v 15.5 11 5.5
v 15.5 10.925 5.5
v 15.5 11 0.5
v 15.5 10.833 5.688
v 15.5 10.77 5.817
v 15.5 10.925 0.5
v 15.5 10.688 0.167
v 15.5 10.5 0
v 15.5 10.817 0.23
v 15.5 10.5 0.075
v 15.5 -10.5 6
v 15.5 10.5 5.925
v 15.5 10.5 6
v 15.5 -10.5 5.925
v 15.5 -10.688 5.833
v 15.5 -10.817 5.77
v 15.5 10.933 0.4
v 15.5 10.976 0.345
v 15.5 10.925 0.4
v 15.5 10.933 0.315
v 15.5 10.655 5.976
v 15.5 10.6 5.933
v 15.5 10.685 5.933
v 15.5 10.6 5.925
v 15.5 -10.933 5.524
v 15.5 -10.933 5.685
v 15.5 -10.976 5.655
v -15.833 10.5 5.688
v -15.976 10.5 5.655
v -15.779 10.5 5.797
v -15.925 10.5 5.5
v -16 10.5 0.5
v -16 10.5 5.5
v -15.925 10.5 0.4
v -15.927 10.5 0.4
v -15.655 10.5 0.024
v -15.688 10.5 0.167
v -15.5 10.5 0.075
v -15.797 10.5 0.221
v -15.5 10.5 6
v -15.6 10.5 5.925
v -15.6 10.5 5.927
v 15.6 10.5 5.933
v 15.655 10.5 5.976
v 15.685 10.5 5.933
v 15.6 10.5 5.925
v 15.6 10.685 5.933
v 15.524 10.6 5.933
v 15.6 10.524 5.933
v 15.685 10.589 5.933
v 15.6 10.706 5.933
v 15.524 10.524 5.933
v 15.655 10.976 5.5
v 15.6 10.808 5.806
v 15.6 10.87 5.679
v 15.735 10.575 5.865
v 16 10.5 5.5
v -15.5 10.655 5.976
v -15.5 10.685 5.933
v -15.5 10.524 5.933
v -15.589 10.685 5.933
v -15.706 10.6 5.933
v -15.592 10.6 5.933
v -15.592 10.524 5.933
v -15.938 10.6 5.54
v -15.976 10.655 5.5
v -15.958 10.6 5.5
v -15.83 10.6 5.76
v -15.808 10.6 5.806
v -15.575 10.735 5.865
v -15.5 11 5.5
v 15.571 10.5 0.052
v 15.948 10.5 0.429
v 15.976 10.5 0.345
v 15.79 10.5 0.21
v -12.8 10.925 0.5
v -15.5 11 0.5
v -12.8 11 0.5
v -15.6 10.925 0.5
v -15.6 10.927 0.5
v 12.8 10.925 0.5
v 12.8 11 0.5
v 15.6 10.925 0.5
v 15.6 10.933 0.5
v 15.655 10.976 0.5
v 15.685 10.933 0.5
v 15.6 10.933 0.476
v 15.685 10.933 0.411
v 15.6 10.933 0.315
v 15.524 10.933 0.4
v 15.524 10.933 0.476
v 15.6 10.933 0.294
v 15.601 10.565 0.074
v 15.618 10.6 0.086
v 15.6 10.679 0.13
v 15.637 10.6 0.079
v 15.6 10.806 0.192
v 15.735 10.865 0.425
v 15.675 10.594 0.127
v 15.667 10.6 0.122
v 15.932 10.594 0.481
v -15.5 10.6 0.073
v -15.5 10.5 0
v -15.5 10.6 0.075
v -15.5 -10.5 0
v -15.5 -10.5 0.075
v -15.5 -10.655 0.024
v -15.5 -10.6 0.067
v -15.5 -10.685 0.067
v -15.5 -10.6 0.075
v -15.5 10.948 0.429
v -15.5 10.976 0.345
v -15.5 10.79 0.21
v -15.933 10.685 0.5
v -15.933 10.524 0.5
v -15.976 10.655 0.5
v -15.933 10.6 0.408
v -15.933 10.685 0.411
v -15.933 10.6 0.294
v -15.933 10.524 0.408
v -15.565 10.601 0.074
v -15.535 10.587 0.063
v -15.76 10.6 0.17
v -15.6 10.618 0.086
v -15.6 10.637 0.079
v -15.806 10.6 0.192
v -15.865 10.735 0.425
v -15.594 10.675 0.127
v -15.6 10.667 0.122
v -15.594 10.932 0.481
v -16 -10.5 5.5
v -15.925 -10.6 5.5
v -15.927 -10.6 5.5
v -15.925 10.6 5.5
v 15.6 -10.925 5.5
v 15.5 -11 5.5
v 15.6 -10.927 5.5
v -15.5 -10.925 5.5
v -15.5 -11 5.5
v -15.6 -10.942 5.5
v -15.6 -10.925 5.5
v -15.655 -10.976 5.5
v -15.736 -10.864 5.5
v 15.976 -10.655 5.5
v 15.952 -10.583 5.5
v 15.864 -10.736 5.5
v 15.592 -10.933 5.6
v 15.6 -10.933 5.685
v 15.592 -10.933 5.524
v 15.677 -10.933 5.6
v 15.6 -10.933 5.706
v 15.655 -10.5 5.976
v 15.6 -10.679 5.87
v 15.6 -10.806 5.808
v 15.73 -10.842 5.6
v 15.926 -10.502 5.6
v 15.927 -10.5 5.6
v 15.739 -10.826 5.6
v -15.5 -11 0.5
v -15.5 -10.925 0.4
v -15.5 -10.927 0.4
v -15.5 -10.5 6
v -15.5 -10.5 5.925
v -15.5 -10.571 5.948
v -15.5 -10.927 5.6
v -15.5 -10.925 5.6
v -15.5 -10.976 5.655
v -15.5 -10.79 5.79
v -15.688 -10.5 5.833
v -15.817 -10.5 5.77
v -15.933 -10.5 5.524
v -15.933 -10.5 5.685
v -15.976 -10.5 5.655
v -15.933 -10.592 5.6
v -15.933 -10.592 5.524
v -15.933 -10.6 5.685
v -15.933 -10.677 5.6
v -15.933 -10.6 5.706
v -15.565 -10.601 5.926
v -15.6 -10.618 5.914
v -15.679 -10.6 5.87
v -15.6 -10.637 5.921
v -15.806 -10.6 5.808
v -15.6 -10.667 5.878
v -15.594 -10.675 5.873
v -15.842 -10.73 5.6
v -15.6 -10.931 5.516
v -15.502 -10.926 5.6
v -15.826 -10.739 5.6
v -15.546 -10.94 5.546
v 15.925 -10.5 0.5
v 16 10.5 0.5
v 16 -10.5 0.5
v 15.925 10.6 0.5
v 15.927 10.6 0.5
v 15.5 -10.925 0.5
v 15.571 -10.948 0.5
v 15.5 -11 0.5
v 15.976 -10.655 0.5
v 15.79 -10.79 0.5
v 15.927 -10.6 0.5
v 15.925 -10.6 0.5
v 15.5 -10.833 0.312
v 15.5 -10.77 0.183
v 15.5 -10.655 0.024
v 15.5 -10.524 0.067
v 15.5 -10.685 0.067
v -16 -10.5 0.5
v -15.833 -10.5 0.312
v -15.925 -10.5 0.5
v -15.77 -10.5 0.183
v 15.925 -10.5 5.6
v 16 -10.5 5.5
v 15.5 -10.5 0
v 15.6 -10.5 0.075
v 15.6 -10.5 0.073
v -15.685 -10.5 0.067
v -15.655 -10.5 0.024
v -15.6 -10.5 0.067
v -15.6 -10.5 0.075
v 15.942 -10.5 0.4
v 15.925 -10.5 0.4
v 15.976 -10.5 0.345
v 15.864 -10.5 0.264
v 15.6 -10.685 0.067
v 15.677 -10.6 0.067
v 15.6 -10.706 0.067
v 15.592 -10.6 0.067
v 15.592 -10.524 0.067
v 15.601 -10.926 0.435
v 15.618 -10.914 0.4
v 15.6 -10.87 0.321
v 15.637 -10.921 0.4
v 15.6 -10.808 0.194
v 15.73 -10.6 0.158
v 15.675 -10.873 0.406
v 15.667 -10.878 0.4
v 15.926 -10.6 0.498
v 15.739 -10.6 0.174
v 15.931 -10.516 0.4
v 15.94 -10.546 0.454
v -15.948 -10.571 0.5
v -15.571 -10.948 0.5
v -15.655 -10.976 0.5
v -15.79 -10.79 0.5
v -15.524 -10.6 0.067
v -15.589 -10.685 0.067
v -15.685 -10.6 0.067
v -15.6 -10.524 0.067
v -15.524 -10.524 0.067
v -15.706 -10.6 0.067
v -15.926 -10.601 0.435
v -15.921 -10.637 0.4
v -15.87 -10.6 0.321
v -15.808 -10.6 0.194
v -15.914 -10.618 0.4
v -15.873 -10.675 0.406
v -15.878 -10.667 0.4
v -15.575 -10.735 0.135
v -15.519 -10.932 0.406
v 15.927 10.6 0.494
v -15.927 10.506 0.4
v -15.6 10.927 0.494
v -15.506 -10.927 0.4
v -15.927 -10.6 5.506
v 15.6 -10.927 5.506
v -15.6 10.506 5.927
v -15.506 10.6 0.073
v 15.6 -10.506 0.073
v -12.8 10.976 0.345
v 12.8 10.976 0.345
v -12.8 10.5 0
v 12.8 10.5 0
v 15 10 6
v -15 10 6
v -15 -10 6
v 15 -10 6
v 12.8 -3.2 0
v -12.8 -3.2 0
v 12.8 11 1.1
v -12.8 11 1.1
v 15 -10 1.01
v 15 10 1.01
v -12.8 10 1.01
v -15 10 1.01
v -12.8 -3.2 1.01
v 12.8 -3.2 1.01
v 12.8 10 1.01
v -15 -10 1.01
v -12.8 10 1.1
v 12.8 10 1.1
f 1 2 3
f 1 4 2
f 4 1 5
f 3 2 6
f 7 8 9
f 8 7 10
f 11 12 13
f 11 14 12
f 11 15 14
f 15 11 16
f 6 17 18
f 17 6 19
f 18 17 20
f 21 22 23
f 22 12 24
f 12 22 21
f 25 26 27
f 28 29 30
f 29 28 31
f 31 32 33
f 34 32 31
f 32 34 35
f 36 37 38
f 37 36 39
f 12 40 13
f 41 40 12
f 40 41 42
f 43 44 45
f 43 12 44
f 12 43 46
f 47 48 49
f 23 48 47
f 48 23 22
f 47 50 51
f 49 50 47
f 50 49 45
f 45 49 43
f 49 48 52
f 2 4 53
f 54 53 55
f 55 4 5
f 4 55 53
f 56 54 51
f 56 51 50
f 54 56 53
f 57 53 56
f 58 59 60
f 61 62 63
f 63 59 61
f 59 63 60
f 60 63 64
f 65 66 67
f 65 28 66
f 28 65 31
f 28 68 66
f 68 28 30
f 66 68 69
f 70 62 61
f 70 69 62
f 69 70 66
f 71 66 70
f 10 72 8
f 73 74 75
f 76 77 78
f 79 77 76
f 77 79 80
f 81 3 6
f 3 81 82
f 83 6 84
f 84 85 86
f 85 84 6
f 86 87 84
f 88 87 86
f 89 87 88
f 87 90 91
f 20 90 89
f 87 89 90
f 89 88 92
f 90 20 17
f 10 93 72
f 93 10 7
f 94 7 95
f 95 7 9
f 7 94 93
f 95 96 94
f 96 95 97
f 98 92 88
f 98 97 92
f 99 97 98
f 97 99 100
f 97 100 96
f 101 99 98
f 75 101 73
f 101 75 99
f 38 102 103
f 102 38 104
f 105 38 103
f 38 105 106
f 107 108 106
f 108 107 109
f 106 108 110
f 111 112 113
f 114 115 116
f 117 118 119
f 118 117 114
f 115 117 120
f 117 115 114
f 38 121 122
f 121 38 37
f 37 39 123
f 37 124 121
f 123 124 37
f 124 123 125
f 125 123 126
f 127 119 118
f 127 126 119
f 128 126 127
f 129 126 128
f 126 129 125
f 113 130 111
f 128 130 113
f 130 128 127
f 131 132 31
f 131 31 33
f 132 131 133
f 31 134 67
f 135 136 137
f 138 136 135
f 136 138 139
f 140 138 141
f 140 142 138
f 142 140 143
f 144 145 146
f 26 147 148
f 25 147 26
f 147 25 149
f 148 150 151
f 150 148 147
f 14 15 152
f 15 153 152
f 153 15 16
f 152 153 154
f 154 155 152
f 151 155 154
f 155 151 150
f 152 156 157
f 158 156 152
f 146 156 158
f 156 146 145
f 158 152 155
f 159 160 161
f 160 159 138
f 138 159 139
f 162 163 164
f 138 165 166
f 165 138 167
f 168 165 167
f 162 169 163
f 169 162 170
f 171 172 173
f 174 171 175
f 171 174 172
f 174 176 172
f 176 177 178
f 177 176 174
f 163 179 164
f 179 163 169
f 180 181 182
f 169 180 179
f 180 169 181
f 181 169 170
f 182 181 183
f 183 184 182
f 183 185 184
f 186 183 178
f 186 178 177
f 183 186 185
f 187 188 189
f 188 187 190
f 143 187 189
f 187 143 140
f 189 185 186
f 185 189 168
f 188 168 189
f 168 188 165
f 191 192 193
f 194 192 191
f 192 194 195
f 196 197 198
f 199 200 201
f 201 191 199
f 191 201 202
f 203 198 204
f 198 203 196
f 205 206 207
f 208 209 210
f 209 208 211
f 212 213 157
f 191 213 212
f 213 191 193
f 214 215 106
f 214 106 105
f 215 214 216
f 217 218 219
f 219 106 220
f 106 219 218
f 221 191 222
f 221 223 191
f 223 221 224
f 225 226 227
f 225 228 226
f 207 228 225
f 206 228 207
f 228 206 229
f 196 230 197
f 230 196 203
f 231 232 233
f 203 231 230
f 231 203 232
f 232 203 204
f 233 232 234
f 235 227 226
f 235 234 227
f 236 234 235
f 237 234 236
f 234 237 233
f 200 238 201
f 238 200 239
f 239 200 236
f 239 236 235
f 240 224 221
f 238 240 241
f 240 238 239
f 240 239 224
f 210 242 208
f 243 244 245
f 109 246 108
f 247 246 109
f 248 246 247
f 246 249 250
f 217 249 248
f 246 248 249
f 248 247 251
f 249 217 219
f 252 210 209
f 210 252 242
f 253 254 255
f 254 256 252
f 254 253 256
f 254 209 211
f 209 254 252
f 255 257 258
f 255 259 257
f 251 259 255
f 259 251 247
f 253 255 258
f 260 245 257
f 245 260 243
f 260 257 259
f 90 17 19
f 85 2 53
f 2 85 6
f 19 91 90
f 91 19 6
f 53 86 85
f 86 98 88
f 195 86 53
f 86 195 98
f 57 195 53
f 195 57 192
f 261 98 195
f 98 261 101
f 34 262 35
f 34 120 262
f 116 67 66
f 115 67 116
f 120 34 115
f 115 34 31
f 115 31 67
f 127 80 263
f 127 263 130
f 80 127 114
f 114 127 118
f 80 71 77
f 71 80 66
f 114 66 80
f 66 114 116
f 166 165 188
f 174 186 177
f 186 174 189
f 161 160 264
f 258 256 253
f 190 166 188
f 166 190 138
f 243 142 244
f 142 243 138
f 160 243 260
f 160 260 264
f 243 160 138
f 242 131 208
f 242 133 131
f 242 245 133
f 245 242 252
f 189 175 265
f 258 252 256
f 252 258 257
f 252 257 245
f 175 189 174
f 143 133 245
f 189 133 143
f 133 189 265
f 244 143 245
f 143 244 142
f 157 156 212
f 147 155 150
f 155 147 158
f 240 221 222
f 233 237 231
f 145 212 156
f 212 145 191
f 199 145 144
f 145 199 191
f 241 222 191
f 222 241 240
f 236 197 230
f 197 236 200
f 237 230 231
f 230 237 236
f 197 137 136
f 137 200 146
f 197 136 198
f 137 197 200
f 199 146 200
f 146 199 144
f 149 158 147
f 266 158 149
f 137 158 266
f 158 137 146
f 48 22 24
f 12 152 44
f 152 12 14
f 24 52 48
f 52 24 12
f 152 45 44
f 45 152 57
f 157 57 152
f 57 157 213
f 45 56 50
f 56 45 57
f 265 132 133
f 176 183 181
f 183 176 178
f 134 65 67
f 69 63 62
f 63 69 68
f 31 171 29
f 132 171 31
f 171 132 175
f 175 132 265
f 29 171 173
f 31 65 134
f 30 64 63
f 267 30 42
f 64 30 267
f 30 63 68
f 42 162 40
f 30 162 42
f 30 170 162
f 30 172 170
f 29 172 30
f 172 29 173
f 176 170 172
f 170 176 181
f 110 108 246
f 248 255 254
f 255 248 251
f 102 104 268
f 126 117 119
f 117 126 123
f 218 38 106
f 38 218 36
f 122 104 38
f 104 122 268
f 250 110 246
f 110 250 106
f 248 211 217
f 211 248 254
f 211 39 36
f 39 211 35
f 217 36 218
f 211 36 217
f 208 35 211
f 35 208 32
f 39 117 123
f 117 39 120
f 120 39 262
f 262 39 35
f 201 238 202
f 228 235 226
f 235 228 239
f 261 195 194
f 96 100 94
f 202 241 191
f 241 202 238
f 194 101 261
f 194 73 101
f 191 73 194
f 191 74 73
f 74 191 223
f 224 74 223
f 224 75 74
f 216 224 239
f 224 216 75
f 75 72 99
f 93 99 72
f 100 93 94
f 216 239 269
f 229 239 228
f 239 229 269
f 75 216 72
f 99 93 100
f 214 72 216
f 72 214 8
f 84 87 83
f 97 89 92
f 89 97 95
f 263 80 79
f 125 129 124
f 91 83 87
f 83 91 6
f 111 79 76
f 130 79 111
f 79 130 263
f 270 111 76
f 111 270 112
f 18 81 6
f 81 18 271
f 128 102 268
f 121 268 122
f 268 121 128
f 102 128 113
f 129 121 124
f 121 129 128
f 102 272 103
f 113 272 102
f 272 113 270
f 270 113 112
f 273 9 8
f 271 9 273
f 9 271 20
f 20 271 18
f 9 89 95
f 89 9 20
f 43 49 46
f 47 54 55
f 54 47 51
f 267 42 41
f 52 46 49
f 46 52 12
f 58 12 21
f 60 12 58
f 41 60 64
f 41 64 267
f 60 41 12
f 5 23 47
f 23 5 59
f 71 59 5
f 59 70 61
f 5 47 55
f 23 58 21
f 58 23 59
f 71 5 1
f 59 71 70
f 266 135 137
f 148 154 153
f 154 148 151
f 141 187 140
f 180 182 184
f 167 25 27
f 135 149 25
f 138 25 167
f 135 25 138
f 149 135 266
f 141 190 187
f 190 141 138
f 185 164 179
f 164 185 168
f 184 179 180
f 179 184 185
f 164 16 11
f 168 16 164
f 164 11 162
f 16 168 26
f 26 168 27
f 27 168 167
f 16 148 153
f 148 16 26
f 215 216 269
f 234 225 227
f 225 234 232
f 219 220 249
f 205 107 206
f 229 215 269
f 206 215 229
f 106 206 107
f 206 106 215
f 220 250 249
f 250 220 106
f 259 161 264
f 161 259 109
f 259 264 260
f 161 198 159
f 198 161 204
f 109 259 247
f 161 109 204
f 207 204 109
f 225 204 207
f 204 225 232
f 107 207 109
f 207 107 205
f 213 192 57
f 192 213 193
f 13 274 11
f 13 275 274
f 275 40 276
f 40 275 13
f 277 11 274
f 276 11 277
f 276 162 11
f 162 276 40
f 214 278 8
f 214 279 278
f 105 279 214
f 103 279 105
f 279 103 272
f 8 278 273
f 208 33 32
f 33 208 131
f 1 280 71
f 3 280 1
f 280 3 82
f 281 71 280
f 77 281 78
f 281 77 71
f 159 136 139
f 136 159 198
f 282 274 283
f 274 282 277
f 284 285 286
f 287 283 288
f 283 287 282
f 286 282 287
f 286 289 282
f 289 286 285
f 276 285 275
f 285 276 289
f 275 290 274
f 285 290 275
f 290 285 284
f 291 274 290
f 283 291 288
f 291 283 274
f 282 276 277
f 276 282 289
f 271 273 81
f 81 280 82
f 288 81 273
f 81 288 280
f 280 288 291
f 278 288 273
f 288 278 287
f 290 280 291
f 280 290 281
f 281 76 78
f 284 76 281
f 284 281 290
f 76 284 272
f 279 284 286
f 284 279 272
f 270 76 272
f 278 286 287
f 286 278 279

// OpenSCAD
// file: edge.scad
module circular_edge(length, radius){ //单个圆边
    difference(){
        translate([0,0,-0.1])
        cube([radius+0.1,radius+0.1,length+0.2]);
        translate([0,0,-0.2])
        cylinder(h=length+0.4, r=radius);
    }
}

module circular_edge_dim(size, radius){ //在一个维度上的四个圆边
    if (!is_list(size)) {
        size=[size,size,size];
    }
    translate([size[0]-radius,size[1]-radius,radius])
    rotate([0, 0, 0])
    circular_edge(length=size[2]-radius*2, radius=radius);
    translate([radius,size[1]-radius,radius])
    rotate([0, 0, 90])
    circular_edge(length=size[2]-radius*2, radius=radius);
    translate([radius,radius,radius])
    rotate([0, 0, 180])
    circular_edge(length=size[2]-radius*2, radius=radius);
    translate([size[0]-radius,radius,radius])
    rotate([0, 0, 270])
    circular_edge(length=size[2]-radius*2, radius=radius);
}

module cube_circular_edge(size, radius){ //长方体的12个圆边
    if (!is_list(size)) {
        size=[size,size,size];
    }
    rotate([0, 0, 0])
    circular_edge_dim(size=[size[0],size[1],size[2]],radius=radius);
    rotate([90, 0, 0])translate([0,0,-size[1]])
    circular_edge_dim(size=[size[0],size[2],size[1]],radius=radius);
    rotate([0, 90, 0])translate([-size[2],0,0])
    circular_edge_dim(size=[size[2],size[1],size[0]],radius=radius);
}
// file: angle.scad
module circular_angle(radius){ //单个圆角
    difference(){
        cube(radius+0.1);
        sphere(r=radius);
    }
}

module cube_circular_angle(size, radius){ //长方体的6个圆角
    if (!is_list(size)) {
        size=[size,size,size];
    }

    translate([size[0]-radius,size[1]-radius,size[2]-radius])
    rotate([0, 0, 0])
    circular_angle(radius=radius);
    translate([radius,size[1]-radius,size[2]-radius])
    rotate([0, 0, 90])
    circular_angle(radius=radius);

    translate([size[0]-radius,size[1]-radius,radius])
    rotate([270, 0, 0])
    circular_angle(radius=radius);
    translate([radius,size[1]-radius,radius])
    rotate([270, 0, 90])
    circular_angle(radius=radius);

    translate([size[0]-radius,radius,size[2]-radius])
    rotate([90, 0, 0])
    circular_angle(radius=radius);
    translate([radius,radius,size[2]-radius])
    rotate([90, 0, 270])
    circular_angle(radius=radius);
    
    translate([size[0]-radius,radius,radius])
    rotate([180, 0, 0])
    circular_angle(radius=radius);
    translate([radius,radius,radius])
    rotate([180, 0, 270])
    circular_angle(radius=radius);
}
// file: rounded_cube.scad
include <angle.scad>
include <edge.scad>

module cube_round(size, radius){ //长方体的圆角和圆边
    cube_circular_angle(size=size, radius=radius);
    cube_circular_edge(size=size, radius=radius);
}

module rounded_cube(size, radius){ //圆角圆边长方体
    difference(){
        cube(size=size);
        cube_circular_angle(size=size, radius=radius);
        cube_circular_edge(size=size, radius=radius);
    }
}
// file: tank.scad
include <rounded_cube.scad>

//内部尺寸、厚度
module simple_tank(inner_size, thickness){ //简单直角水槽
    if (!is_list(inner_size)) {
        inner_size=[inner_size,inner_size,inner_size];
    }
    module _tank(){
        difference(){
            cube([inner_size[0]+thickness*2, inner_size[1]+thickness*2, inner_size[2]+thickness]);
            translate([thickness, thickness, thickness+0.01])
            cube([inner_size[0], inner_size[1], inner_size[2]+0.01]);
        }
    }
    if (center) translate([-inner_size[0]/2-thickness, -inner_size[1]/2-thickness, 0])_tank();
    else _tank();
}

//内部尺寸、厚度、圆角半径
module rounded_tank(inner_size, thickness, radius, center=false){ //圆角圆边水槽
    if (!is_list(inner_size)) {
        inner_size=[inner_size,inner_size,inner_size];
    }
    module _tank(){
        difference(){
            rounded_cube(size=[inner_size[0]+thickness*2, inner_size[1]+thickness*2, inner_size[2]+thickness],radius=radius);
            translate([thickness, thickness, thickness+0.01])
            cube([inner_size[0], inner_size[1], inner_size[2]+0.01]);
        }
    }
    if (center) translate([-inner_size[0]/2-thickness, -inner_size[1]/2-thickness, 0])_tank();
    else _tank();
}
// main file
include <tank.scad>

module frout_screen(screen_size, screen_margin_bottom, inner_size, thickness, radius) { //前面板壳
    if (!is_list(screen_size)) {
        screen_size=[screen_size,screen_size];
    }
    difference(){
        rounded_tank(inner_size, thickness, radius, center=true);
        translate([-screen_size[0]/2, screen_margin_bottom-screen_size[1]/2, -0.1]) 
        cube([screen_size[0],screen_size[1],thickness+0.2]);
    }
    
}

frout_screen(
    screen_size=[25.6,14.4],
    screen_margin_bottom=4,
    inner_size=[30,20,5],
    thickness=1,radius=0.5);
